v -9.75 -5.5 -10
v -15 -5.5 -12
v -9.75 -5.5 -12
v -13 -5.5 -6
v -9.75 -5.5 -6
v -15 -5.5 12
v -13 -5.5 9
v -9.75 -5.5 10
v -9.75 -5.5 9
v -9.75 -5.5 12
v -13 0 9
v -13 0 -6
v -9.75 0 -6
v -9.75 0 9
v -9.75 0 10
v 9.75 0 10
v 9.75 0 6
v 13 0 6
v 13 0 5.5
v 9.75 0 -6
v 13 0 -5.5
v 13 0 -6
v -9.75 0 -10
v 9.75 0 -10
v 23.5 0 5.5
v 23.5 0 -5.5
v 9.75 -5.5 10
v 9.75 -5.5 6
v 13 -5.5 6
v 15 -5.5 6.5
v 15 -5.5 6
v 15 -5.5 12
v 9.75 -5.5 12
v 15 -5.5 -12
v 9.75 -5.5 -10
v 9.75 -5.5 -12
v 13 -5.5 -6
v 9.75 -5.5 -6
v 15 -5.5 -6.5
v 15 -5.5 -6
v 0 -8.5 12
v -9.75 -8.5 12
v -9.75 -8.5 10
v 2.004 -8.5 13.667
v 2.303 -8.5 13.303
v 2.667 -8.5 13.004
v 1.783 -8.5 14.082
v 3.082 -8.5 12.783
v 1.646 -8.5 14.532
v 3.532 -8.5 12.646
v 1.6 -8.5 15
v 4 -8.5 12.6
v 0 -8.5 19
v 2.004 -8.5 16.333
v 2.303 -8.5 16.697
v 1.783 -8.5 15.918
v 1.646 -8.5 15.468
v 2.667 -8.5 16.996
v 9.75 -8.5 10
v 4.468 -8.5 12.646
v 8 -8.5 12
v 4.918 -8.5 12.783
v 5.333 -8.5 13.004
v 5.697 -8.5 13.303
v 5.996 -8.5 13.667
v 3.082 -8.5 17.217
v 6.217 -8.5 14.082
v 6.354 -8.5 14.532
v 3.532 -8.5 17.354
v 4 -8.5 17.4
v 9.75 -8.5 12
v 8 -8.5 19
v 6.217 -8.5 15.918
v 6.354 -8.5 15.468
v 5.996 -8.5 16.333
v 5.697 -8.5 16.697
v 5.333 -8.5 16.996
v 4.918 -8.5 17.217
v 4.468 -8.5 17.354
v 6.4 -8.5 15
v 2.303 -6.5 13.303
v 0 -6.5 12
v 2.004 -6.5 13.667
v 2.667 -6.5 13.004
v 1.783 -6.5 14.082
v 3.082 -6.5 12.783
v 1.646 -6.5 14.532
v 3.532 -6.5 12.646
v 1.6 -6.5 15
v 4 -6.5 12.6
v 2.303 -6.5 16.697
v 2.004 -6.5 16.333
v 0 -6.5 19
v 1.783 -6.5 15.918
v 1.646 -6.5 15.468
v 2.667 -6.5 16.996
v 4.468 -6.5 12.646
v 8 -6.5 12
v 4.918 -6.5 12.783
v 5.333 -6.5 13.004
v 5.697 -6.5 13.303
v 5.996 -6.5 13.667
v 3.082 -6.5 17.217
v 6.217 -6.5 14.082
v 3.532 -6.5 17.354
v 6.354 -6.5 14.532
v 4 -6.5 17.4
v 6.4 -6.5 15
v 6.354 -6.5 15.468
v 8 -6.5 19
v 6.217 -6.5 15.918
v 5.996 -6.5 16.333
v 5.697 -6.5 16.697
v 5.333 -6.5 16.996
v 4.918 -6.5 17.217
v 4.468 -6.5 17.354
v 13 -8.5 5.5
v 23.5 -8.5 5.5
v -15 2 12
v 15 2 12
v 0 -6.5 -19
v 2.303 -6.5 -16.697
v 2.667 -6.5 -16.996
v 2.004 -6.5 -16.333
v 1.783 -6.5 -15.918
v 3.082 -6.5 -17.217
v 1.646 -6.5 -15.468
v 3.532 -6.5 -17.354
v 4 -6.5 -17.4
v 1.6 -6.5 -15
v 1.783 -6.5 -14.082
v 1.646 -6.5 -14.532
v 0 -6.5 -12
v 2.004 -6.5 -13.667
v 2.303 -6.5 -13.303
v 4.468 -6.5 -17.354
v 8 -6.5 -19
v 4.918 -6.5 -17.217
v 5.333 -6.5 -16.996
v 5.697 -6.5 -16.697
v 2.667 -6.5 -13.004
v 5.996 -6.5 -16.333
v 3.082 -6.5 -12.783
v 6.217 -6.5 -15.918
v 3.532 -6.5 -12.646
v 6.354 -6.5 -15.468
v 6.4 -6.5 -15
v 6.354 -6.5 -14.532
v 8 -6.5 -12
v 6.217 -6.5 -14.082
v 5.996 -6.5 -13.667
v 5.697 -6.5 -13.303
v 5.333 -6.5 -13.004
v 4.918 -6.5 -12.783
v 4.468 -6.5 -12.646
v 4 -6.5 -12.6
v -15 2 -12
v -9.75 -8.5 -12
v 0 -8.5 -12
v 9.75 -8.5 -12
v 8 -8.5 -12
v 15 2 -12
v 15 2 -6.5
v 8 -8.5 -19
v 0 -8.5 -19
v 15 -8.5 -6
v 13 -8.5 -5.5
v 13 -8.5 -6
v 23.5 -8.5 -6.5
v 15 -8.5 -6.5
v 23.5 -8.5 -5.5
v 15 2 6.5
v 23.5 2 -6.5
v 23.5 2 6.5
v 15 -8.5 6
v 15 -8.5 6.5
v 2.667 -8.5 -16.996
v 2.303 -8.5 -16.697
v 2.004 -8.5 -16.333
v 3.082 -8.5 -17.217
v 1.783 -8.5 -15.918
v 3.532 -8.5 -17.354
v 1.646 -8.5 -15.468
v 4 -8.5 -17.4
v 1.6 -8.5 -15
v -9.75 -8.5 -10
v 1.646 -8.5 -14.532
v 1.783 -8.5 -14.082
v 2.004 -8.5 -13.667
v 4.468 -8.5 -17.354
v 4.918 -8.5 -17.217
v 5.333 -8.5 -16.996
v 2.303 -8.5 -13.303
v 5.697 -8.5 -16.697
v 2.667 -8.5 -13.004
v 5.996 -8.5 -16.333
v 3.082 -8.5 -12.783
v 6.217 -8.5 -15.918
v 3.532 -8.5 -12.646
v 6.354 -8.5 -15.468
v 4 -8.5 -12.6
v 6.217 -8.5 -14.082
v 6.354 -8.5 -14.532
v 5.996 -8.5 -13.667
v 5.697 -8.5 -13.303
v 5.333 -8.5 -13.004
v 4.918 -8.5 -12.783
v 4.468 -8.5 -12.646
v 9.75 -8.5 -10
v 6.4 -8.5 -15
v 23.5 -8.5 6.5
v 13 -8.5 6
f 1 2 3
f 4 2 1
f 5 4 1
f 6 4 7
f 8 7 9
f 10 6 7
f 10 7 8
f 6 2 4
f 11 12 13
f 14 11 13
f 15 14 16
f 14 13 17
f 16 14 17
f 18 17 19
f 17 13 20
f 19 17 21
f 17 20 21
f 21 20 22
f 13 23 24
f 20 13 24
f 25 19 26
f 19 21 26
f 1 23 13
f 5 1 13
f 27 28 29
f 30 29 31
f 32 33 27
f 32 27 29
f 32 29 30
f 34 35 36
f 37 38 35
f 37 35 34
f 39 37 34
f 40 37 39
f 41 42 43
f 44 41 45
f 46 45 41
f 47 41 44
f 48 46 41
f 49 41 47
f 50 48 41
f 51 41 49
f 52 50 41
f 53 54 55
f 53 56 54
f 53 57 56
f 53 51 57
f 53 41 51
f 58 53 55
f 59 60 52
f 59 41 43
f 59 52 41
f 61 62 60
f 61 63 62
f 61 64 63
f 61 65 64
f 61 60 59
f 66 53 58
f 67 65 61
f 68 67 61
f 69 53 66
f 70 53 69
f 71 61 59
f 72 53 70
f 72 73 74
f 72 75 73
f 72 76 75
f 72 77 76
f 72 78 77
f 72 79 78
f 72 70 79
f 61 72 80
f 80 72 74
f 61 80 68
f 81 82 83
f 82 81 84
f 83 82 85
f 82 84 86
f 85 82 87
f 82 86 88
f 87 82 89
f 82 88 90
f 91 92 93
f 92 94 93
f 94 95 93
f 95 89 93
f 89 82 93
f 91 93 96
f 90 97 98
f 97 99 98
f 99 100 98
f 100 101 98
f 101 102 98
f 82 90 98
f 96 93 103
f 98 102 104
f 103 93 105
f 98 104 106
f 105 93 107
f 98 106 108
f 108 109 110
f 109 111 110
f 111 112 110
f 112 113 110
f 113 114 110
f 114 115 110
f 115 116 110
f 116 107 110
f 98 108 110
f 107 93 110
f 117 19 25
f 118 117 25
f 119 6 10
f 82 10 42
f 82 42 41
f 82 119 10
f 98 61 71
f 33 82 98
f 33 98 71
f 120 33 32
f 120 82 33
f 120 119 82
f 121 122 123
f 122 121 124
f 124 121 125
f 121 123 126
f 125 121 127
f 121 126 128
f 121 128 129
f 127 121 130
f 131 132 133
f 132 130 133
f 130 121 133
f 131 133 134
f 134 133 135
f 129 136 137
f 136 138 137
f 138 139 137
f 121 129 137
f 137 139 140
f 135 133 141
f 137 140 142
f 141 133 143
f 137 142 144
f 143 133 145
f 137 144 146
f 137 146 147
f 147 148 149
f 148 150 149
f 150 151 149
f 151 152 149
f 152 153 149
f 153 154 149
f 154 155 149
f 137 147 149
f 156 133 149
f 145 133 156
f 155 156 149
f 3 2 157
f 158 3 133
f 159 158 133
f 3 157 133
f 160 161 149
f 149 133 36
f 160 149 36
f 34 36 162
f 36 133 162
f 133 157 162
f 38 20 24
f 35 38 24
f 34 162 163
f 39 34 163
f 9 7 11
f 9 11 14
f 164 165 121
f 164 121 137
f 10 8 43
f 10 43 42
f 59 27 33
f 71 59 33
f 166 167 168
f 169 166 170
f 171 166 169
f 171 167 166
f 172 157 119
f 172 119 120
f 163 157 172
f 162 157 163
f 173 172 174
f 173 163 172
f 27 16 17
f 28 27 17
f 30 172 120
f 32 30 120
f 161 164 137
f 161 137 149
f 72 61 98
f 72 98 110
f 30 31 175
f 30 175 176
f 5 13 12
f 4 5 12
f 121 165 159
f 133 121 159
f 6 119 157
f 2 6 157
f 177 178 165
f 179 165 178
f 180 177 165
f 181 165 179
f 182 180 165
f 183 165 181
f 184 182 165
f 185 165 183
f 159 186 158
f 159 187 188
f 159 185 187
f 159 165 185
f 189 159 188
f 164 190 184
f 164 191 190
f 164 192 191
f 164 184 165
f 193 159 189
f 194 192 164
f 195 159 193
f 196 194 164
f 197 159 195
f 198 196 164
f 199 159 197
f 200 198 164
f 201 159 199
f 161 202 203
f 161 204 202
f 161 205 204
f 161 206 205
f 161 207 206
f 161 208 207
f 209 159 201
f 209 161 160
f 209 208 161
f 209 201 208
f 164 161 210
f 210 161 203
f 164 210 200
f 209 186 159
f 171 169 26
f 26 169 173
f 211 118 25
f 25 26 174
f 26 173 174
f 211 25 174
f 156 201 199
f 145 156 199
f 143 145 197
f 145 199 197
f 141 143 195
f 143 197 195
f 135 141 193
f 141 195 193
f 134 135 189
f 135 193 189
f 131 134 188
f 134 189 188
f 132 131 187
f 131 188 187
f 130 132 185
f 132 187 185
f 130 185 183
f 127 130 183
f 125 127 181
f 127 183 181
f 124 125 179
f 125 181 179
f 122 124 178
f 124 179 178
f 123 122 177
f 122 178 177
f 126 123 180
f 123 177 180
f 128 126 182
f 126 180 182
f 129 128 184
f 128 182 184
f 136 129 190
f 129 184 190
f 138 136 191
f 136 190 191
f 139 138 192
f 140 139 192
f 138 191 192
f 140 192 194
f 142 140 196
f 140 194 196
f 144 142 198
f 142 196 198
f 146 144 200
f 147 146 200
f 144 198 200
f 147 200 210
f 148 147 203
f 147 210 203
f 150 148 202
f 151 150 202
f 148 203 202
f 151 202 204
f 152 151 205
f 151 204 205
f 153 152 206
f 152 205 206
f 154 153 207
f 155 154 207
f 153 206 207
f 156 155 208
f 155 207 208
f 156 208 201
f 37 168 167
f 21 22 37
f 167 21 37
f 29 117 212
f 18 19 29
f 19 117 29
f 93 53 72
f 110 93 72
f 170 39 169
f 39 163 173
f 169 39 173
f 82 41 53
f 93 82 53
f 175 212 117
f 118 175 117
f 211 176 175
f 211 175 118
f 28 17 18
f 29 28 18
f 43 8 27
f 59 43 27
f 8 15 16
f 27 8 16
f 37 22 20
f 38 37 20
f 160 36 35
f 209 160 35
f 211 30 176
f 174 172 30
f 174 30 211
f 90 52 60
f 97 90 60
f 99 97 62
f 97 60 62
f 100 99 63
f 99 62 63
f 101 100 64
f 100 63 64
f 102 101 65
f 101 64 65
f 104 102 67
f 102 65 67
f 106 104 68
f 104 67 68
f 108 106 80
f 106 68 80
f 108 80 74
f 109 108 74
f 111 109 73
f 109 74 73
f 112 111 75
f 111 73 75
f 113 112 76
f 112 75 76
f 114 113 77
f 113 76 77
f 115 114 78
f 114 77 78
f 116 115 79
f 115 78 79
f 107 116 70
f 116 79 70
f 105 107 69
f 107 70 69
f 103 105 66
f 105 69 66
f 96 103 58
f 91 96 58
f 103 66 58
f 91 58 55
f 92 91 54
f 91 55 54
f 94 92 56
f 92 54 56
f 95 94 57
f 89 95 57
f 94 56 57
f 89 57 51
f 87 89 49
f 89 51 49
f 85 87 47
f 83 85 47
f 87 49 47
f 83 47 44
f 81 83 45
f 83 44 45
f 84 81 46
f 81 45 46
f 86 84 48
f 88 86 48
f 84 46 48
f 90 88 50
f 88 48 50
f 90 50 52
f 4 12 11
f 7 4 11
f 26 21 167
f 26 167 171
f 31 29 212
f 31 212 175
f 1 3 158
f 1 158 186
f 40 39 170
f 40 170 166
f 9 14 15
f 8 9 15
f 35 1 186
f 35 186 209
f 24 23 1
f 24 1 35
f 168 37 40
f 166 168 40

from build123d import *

# Parameters (mm, degrees)
SKETCH_1_W          = 30
SKETCH_1_H          = 24
EXTRUDE_1_DEPTH     = 2
SKETCH_2_W          = 19.5
SKETCH_2_H          = 2
SKETCH_2_W_2        = 2
SKETCH_2_H_2        = 0.5
SKETCH_2_H_3        = 12
EXTRUDE_2_DEPTH     = 5.5
SKETCH_3_W          = 19.5
SKETCH_3_H          = 2
SKETCH_3_W_2        = 2
SKETCH_3_H_2        = 0.5
EXTRUDE_3_DEPTH     = 3
SKETCH_4_W          = 8.5
SKETCH_4_H          = 13
EXTRUDE_4_DEPTH     = 2
SKETCH_5_W          = 8.5
SKETCH_5_H          = 1
EXTRUDE_5_DEPTH     = 8.5
SKETCH_6_W          = 8
SKETCH_6_H          = 7
SKETCH_6_R          = 2.4
EXTRUDE_6_DEPTH     = 2
SKETCH_7_W          = 3.25
SKETCH_7_H          = 3
CUT_EXTRUDE_1_DEPTH = 5.5


with BuildPart() as part:
    # 草图1 → 凸台-拉伸1 (new body)
    with BuildSketch(Plane(origin=(0, 0, 0), x_dir=(1, 0, 0), z_dir=(0, 1, 0))):
        Rectangle(SKETCH_1_W, SKETCH_1_H)
    extrude(amount=EXTRUDE_1_DEPTH)

    # 草图2 → 凸台-拉伸2 (add)
    with BuildSketch(Plane.XZ):
        Polygon((-9.75, 12), (-15, 12), (-15, 6), (-13, 6), (-9.75, 6), (-9.75, 10), align=None)
        with Locations((0, 11)):
            Rectangle(SKETCH_2_W, SKETCH_2_H)
        Polygon((15, 12), (9.75, 12), (9.75, 10), (9.75, 6), (13, 6), (15, 6), align=None)
        with Locations((14, 5.75)):
            Rectangle(SKETCH_2_W_2, SKETCH_2_H_2)
        with Locations((14, -5.75)):
            Rectangle(SKETCH_2_W_2, SKETCH_2_H_2)
        Polygon((9.75, -10), (9.75, -12), (15, -12), (15, -6), (13, -6), (9.75, -6), align=None)
        with Locations((0, -11)):
            Rectangle(SKETCH_2_W, SKETCH_2_H)
        Polygon((-13, -6), (-15, -6), (-15, -12), (-9.75, -12), (-9.75, -10), (-9.75, -6), align=None)
        with Locations((-14, 0)):
            Rectangle(SKETCH_2_W_2, SKETCH_2_H_3)
    extrude(amount=EXTRUDE_2_DEPTH)

    # 草图3 → 凸台-拉伸3 (add)
    with BuildSketch(Plane.XZ.offset(5.5)):
        with Locations((0, 11)):
            Rectangle(SKETCH_3_W, SKETCH_3_H)
        with Locations((0, -11)):
            Rectangle(SKETCH_3_W, SKETCH_3_H)
        with Locations((14, -5.75)):
            Rectangle(SKETCH_3_W_2, SKETCH_3_H_2)
        with Locations((14, 5.75)):
            Rectangle(SKETCH_3_W_2, SKETCH_3_H_2)
    extrude(amount=EXTRUDE_3_DEPTH)

    # 草图4 → 凸台-拉伸4 (add)
    with BuildSketch(Plane(origin=(0, 2, 0), x_dir=(1, 0, 0), z_dir=(0, 1, 0))):
        with Locations((19.25, 0)):
            Rectangle(SKETCH_4_W, SKETCH_4_H)
    extrude(amount=-EXTRUDE_4_DEPTH)

    # 草图5 → 凸台-拉伸5 (add)
    with BuildSketch(Plane.XZ):
        with Locations((19.25, 6)):
            Rectangle(SKETCH_5_W, SKETCH_5_H)
        with Locations((19.25, -6)):
            Rectangle(SKETCH_5_W, SKETCH_5_H)
    extrude(amount=EXTRUDE_5_DEPTH)

    # 草图6 → 凸台-拉伸6 (add)
    # profile 1 of 2: a face of its own
    with BuildSketch(Plane.XZ.offset(8.5)):
        with Locations((4, 15.5)):
            Rectangle(SKETCH_6_W, SKETCH_6_H)
        with Locations(Location((4, 15, 0), (0, 0, 270))):
            Circle(SKETCH_6_R, mode=Mode.SUBTRACT)
    # profile 2 of 2: a face of its own
    with BuildSketch(Plane.XZ.offset(8.5)):
        with Locations((4, -15.5)):
            Rectangle(SKETCH_6_W, SKETCH_6_H)
        with Locations(Location((4, -15, 0), (0, 0, 90))):
            Circle(SKETCH_6_R, mode=Mode.SUBTRACT)
    extrude(amount=-EXTRUDE_6_DEPTH)

    # 草图7 → 切除-拉伸1 (cut)
    with BuildSketch(Plane.XZ.offset(5.5)):
        with Locations((-11.375, 7.5)):
            Rectangle(SKETCH_7_W, SKETCH_7_H)
    extrude(amount=-CUT_EXTRUDE_1_DEPTH, mode=Mode.SUBTRACT)


solid = part.part
